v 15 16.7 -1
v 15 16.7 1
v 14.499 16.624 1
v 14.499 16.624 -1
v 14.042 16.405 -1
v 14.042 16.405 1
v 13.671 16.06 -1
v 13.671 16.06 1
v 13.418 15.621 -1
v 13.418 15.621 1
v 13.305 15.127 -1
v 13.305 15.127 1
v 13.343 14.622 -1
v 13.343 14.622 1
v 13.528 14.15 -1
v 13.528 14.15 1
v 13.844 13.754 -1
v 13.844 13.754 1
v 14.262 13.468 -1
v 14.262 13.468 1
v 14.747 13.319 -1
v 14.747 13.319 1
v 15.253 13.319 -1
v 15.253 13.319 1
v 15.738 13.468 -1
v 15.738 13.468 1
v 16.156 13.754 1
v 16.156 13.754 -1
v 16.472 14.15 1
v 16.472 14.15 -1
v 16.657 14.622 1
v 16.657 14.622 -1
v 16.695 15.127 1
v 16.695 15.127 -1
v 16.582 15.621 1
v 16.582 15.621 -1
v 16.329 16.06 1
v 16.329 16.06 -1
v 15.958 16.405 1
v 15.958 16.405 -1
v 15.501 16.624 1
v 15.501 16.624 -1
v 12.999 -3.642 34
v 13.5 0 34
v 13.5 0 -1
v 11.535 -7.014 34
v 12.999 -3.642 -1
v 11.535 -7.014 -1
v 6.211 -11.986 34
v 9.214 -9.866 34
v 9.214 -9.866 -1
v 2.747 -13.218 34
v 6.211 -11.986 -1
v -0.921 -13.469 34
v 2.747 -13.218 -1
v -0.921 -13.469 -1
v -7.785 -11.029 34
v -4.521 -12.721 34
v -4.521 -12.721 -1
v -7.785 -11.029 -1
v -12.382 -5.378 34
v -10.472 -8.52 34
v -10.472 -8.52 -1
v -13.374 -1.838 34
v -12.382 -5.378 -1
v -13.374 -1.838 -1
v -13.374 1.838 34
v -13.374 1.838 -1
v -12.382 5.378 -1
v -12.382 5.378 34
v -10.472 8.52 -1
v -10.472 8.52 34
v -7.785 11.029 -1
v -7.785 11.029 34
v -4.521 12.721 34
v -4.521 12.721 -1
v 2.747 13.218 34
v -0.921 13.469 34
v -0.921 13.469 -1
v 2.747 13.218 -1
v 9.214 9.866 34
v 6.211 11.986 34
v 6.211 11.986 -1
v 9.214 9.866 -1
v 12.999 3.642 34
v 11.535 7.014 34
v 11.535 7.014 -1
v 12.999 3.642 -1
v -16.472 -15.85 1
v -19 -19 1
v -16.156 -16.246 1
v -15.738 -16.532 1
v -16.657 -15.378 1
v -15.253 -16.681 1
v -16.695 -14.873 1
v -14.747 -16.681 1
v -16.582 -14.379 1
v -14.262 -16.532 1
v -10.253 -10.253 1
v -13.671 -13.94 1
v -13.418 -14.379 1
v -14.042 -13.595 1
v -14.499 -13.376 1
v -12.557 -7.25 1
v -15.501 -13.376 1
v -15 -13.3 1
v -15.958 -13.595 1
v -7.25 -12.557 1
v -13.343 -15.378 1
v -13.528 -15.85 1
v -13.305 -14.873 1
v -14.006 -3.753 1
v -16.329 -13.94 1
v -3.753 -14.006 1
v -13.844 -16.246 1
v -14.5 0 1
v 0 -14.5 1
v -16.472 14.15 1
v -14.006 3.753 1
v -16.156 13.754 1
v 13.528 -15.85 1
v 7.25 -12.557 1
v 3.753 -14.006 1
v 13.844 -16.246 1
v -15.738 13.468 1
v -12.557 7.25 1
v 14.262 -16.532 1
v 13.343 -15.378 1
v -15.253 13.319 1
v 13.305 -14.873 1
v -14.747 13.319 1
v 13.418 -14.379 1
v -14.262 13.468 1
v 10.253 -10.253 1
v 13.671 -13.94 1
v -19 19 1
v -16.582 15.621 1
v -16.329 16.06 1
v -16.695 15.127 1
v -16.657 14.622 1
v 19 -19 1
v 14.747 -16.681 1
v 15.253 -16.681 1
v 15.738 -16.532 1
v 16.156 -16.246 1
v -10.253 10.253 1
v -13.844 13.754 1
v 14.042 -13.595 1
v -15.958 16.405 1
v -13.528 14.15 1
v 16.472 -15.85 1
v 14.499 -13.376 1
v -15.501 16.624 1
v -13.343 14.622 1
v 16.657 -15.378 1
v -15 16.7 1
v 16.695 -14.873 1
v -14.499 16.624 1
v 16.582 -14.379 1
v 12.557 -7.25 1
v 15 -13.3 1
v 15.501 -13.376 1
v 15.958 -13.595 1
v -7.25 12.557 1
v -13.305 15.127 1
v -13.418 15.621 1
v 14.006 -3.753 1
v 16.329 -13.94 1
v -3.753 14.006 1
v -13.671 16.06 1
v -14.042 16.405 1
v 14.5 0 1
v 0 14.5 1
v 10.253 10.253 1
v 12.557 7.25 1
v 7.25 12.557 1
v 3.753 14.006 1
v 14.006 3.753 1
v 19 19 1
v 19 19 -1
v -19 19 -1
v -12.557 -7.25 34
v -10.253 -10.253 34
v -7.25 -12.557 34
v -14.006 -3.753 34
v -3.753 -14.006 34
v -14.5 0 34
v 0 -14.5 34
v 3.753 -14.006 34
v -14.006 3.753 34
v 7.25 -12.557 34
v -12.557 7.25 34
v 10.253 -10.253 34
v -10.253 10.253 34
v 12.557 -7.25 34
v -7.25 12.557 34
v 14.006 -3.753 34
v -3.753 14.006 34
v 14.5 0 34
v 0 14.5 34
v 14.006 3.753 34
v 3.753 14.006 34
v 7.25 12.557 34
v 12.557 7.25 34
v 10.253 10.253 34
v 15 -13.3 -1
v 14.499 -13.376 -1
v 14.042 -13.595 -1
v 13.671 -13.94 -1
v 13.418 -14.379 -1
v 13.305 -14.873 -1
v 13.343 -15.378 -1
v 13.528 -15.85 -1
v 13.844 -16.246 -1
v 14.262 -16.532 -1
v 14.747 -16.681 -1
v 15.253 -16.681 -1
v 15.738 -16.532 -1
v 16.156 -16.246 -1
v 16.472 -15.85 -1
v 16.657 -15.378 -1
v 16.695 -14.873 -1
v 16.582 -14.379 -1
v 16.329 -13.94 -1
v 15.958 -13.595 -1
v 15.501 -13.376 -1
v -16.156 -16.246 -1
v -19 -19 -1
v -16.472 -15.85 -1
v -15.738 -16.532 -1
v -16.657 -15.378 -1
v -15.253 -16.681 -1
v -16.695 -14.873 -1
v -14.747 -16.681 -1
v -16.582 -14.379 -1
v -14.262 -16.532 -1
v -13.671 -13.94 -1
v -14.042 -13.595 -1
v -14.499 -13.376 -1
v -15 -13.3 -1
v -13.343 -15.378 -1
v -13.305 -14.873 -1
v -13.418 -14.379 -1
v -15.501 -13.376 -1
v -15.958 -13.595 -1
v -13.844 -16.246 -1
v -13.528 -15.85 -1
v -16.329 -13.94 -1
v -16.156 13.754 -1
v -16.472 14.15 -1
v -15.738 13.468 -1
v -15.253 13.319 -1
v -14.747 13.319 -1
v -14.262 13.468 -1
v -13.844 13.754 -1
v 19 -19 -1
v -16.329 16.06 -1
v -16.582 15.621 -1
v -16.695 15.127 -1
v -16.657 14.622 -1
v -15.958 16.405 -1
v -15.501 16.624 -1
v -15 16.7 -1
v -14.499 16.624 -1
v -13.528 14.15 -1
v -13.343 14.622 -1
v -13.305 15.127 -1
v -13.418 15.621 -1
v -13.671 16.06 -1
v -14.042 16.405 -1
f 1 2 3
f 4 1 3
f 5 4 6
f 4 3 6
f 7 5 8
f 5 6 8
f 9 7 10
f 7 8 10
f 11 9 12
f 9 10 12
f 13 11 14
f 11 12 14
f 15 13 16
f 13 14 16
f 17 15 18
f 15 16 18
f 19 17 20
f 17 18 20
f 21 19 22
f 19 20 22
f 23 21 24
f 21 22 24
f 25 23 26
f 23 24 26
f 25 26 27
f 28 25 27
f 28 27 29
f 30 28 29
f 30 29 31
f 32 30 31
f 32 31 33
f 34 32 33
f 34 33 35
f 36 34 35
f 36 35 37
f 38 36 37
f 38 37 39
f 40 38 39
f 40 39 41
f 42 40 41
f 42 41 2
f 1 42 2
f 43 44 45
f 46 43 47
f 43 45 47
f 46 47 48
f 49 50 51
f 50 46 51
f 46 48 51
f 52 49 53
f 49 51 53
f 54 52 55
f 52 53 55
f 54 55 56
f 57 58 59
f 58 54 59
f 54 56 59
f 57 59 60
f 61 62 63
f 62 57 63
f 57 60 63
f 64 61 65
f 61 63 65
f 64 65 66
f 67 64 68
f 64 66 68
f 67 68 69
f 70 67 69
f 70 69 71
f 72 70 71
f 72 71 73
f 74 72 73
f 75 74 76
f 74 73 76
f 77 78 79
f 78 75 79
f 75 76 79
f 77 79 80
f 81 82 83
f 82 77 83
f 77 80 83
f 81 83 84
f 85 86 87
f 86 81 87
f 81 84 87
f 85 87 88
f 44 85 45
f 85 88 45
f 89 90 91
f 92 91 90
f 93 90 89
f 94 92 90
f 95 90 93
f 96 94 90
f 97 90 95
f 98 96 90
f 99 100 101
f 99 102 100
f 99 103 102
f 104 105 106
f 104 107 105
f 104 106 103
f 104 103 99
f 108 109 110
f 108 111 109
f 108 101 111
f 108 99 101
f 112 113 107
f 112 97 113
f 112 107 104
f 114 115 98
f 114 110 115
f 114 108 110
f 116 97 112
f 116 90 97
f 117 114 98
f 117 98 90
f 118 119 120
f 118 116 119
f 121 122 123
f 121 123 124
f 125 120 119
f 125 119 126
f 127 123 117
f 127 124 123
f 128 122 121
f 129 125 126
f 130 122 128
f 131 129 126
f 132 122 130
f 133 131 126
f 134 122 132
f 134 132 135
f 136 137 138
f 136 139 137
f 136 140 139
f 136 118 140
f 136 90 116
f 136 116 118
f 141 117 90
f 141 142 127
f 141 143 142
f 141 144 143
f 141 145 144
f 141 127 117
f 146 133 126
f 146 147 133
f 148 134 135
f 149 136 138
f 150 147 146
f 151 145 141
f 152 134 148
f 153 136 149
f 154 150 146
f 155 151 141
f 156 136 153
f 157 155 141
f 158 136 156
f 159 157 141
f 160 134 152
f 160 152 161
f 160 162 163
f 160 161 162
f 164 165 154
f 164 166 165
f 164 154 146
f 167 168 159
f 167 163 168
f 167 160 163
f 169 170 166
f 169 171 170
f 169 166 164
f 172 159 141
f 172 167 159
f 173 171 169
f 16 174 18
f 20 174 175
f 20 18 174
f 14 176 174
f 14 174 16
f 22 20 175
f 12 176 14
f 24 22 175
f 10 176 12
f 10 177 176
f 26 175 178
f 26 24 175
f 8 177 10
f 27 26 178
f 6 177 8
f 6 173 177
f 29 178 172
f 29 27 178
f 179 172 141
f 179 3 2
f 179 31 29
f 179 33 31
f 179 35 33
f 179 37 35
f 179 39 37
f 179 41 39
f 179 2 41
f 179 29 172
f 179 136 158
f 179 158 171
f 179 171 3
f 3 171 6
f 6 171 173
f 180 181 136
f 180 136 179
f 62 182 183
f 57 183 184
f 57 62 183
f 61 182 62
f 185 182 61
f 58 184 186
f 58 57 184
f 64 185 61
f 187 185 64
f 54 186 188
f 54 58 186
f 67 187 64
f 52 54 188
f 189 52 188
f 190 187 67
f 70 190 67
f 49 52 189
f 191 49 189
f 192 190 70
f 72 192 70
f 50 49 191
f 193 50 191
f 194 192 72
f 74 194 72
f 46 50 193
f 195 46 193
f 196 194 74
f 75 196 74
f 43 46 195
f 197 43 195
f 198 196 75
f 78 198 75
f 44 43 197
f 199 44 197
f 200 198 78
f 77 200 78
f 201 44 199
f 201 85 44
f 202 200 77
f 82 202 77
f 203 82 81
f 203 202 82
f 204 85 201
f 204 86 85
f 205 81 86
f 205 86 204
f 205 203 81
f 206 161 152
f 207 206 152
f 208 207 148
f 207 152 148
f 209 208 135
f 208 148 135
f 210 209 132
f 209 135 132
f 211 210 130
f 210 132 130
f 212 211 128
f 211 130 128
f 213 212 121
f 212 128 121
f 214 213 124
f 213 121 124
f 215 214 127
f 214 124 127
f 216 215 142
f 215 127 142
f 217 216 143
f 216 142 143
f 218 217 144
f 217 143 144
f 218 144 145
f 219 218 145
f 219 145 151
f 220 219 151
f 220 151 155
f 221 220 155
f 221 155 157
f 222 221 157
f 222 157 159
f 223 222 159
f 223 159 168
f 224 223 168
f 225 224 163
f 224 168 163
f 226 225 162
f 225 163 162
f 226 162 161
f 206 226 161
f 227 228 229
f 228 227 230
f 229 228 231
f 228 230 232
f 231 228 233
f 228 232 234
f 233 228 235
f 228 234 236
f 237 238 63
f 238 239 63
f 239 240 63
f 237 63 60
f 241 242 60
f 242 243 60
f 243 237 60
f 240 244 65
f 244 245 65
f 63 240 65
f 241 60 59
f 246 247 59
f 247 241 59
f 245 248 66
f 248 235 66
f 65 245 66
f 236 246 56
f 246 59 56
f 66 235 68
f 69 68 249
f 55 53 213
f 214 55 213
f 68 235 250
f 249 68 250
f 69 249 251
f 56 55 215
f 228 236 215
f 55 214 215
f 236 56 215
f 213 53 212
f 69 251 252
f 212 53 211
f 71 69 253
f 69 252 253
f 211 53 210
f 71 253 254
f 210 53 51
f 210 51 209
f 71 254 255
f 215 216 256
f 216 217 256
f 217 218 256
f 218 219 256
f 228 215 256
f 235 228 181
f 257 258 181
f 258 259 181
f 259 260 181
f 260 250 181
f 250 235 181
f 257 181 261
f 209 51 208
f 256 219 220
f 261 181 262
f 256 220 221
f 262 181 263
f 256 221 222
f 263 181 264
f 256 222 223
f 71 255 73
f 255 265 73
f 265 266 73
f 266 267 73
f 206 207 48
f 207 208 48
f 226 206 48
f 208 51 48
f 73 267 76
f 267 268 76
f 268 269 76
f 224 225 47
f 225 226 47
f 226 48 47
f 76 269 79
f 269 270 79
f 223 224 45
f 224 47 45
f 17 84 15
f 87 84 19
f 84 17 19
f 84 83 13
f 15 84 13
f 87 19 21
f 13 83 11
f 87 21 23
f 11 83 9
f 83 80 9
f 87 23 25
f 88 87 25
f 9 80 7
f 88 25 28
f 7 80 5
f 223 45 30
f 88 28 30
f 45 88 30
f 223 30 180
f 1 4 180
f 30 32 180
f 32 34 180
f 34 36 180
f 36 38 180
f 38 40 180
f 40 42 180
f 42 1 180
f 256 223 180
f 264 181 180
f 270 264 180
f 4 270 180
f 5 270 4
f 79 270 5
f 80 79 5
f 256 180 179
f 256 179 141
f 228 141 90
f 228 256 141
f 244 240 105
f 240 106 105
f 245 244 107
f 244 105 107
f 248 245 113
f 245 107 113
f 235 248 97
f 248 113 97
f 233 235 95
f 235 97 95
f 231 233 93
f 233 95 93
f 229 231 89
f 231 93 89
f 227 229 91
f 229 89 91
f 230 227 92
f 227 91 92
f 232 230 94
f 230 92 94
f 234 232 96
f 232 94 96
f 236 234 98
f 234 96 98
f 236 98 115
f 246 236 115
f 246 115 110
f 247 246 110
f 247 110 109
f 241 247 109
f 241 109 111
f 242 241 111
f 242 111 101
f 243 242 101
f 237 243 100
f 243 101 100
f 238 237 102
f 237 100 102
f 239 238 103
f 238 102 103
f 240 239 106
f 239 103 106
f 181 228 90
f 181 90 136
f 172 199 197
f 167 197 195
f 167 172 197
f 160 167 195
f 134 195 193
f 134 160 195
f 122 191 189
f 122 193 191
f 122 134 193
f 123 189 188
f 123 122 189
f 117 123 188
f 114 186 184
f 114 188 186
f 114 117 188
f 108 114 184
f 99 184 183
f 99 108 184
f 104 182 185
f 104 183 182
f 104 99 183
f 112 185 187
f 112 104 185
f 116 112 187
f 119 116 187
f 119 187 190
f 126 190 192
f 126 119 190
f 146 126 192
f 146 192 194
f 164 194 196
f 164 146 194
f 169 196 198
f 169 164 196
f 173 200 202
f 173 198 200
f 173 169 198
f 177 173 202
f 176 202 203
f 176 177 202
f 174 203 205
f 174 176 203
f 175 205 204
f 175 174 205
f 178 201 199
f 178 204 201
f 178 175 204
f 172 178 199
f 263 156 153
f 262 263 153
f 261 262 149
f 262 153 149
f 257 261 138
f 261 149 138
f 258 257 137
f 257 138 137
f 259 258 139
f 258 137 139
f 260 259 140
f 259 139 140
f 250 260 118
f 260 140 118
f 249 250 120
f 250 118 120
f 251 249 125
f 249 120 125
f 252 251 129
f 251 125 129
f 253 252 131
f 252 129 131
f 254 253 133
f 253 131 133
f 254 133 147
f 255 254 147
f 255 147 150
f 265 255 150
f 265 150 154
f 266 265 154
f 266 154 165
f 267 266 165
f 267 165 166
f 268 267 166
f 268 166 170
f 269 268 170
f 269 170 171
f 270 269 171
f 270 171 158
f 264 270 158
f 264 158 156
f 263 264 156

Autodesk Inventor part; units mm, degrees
ref_plane "YZ Plane" through (0, 0, 0) normal (1, 0, 0) x (0, 1, 0)
ref_plane "XZ Plane" through (0, 0, 0) normal (0, 1, 0) x (-1, 0, 0)
ref_plane "XY Plane" through (0, 0, 0) normal (0, 0, 1) x (1, 0, 0)
sketch "Sketch1" plane through (0, 0, 0) normal (0, 0, 1) x (1, 0, 0)
  line L0 (-19, 19) -> (19, 19)
  line L1 (19, 19) -> (19, -19)
  line L2 (19, -19) -> (-19, -19)
  line L3 (-19, -19) -> (-19, 19)
  line L4 (-19, 19) -> (19, -19) construction
  line L5 (19, 19) -> (-19, -19) construction
  line L6 (-11, 11) -> (11, -11) construction
  line L7 (11, 11) -> (-11, -11) construction
  circle A0 centre (0, 0) radius 13.5
  dimension "d0" = 38
  dimension "d1" = 38
  dimension "d2" = 22
  dimension "d3" = 22
  dimension "d30" = 27
extrude "Extrusion1" add sketch "Sketch1" along normal mid plane 2
sketch "Sketch2" plane through (0, 0, 1) normal (0, 0, 1) x (1, 0, 0)
  line L0 (-13, 13) -> (13, -13) construction
  line L1 (13, 13) -> (-13, -13) construction
  line L2 (-11.5, -11.5) -> (11.5, 11.5) construction
  line L3 (11.5, -11.5) -> (-11.5, 11.5) construction
  circle A0 centre (0, 0) radius 13.5
  circle A1 centre (0, 0) radius 14.5
  dimension "d6" = 26
  dimension "d7" = 26
  dimension "d8" = 23
  dimension "d28" = 27
  dimension "d29" = 29
extrude "Extrusion2" add sketch "Sketch2" along normal blind 33
sketch "Sketch3" plane through (0, 0, -1) normal (0, 0, -1) x (-1, 0, 0)
  line L0 (19, 19) -> (19, -19) projected
  line L1 (19, -19) -> (-19, -19) projected
  line L2 (-19, -19) -> (-19, 19) projected
  line L3 (-19, 19) -> (19, 19) projected
  circle A0 centre (0, 0) radius 13.5 projected
  point P0 (15, -15)
  point P1 (-15, -15)
  point P2 (15, 15)
  point P3 (-15, 15)
  dimension "d11" = 15
  dimension "d12" = 15
  dimension "d15" = 30
  dimension "d18" = 30
hole "Hole1" at (-15, -15, -1) at (15, -15, -1) at (-15, 15, -1) at (15, 15, -1) direction (0, 0, 1) diameter 3.4 end through all clearance for "Flat Head Machine Screw" size "M3" standard "Ansi Metric M Profile"
equation "\"d1\" = d0"
equation "\"d3\" = d2"
equation "\"d7\" = d6"
properties part number "tube"
